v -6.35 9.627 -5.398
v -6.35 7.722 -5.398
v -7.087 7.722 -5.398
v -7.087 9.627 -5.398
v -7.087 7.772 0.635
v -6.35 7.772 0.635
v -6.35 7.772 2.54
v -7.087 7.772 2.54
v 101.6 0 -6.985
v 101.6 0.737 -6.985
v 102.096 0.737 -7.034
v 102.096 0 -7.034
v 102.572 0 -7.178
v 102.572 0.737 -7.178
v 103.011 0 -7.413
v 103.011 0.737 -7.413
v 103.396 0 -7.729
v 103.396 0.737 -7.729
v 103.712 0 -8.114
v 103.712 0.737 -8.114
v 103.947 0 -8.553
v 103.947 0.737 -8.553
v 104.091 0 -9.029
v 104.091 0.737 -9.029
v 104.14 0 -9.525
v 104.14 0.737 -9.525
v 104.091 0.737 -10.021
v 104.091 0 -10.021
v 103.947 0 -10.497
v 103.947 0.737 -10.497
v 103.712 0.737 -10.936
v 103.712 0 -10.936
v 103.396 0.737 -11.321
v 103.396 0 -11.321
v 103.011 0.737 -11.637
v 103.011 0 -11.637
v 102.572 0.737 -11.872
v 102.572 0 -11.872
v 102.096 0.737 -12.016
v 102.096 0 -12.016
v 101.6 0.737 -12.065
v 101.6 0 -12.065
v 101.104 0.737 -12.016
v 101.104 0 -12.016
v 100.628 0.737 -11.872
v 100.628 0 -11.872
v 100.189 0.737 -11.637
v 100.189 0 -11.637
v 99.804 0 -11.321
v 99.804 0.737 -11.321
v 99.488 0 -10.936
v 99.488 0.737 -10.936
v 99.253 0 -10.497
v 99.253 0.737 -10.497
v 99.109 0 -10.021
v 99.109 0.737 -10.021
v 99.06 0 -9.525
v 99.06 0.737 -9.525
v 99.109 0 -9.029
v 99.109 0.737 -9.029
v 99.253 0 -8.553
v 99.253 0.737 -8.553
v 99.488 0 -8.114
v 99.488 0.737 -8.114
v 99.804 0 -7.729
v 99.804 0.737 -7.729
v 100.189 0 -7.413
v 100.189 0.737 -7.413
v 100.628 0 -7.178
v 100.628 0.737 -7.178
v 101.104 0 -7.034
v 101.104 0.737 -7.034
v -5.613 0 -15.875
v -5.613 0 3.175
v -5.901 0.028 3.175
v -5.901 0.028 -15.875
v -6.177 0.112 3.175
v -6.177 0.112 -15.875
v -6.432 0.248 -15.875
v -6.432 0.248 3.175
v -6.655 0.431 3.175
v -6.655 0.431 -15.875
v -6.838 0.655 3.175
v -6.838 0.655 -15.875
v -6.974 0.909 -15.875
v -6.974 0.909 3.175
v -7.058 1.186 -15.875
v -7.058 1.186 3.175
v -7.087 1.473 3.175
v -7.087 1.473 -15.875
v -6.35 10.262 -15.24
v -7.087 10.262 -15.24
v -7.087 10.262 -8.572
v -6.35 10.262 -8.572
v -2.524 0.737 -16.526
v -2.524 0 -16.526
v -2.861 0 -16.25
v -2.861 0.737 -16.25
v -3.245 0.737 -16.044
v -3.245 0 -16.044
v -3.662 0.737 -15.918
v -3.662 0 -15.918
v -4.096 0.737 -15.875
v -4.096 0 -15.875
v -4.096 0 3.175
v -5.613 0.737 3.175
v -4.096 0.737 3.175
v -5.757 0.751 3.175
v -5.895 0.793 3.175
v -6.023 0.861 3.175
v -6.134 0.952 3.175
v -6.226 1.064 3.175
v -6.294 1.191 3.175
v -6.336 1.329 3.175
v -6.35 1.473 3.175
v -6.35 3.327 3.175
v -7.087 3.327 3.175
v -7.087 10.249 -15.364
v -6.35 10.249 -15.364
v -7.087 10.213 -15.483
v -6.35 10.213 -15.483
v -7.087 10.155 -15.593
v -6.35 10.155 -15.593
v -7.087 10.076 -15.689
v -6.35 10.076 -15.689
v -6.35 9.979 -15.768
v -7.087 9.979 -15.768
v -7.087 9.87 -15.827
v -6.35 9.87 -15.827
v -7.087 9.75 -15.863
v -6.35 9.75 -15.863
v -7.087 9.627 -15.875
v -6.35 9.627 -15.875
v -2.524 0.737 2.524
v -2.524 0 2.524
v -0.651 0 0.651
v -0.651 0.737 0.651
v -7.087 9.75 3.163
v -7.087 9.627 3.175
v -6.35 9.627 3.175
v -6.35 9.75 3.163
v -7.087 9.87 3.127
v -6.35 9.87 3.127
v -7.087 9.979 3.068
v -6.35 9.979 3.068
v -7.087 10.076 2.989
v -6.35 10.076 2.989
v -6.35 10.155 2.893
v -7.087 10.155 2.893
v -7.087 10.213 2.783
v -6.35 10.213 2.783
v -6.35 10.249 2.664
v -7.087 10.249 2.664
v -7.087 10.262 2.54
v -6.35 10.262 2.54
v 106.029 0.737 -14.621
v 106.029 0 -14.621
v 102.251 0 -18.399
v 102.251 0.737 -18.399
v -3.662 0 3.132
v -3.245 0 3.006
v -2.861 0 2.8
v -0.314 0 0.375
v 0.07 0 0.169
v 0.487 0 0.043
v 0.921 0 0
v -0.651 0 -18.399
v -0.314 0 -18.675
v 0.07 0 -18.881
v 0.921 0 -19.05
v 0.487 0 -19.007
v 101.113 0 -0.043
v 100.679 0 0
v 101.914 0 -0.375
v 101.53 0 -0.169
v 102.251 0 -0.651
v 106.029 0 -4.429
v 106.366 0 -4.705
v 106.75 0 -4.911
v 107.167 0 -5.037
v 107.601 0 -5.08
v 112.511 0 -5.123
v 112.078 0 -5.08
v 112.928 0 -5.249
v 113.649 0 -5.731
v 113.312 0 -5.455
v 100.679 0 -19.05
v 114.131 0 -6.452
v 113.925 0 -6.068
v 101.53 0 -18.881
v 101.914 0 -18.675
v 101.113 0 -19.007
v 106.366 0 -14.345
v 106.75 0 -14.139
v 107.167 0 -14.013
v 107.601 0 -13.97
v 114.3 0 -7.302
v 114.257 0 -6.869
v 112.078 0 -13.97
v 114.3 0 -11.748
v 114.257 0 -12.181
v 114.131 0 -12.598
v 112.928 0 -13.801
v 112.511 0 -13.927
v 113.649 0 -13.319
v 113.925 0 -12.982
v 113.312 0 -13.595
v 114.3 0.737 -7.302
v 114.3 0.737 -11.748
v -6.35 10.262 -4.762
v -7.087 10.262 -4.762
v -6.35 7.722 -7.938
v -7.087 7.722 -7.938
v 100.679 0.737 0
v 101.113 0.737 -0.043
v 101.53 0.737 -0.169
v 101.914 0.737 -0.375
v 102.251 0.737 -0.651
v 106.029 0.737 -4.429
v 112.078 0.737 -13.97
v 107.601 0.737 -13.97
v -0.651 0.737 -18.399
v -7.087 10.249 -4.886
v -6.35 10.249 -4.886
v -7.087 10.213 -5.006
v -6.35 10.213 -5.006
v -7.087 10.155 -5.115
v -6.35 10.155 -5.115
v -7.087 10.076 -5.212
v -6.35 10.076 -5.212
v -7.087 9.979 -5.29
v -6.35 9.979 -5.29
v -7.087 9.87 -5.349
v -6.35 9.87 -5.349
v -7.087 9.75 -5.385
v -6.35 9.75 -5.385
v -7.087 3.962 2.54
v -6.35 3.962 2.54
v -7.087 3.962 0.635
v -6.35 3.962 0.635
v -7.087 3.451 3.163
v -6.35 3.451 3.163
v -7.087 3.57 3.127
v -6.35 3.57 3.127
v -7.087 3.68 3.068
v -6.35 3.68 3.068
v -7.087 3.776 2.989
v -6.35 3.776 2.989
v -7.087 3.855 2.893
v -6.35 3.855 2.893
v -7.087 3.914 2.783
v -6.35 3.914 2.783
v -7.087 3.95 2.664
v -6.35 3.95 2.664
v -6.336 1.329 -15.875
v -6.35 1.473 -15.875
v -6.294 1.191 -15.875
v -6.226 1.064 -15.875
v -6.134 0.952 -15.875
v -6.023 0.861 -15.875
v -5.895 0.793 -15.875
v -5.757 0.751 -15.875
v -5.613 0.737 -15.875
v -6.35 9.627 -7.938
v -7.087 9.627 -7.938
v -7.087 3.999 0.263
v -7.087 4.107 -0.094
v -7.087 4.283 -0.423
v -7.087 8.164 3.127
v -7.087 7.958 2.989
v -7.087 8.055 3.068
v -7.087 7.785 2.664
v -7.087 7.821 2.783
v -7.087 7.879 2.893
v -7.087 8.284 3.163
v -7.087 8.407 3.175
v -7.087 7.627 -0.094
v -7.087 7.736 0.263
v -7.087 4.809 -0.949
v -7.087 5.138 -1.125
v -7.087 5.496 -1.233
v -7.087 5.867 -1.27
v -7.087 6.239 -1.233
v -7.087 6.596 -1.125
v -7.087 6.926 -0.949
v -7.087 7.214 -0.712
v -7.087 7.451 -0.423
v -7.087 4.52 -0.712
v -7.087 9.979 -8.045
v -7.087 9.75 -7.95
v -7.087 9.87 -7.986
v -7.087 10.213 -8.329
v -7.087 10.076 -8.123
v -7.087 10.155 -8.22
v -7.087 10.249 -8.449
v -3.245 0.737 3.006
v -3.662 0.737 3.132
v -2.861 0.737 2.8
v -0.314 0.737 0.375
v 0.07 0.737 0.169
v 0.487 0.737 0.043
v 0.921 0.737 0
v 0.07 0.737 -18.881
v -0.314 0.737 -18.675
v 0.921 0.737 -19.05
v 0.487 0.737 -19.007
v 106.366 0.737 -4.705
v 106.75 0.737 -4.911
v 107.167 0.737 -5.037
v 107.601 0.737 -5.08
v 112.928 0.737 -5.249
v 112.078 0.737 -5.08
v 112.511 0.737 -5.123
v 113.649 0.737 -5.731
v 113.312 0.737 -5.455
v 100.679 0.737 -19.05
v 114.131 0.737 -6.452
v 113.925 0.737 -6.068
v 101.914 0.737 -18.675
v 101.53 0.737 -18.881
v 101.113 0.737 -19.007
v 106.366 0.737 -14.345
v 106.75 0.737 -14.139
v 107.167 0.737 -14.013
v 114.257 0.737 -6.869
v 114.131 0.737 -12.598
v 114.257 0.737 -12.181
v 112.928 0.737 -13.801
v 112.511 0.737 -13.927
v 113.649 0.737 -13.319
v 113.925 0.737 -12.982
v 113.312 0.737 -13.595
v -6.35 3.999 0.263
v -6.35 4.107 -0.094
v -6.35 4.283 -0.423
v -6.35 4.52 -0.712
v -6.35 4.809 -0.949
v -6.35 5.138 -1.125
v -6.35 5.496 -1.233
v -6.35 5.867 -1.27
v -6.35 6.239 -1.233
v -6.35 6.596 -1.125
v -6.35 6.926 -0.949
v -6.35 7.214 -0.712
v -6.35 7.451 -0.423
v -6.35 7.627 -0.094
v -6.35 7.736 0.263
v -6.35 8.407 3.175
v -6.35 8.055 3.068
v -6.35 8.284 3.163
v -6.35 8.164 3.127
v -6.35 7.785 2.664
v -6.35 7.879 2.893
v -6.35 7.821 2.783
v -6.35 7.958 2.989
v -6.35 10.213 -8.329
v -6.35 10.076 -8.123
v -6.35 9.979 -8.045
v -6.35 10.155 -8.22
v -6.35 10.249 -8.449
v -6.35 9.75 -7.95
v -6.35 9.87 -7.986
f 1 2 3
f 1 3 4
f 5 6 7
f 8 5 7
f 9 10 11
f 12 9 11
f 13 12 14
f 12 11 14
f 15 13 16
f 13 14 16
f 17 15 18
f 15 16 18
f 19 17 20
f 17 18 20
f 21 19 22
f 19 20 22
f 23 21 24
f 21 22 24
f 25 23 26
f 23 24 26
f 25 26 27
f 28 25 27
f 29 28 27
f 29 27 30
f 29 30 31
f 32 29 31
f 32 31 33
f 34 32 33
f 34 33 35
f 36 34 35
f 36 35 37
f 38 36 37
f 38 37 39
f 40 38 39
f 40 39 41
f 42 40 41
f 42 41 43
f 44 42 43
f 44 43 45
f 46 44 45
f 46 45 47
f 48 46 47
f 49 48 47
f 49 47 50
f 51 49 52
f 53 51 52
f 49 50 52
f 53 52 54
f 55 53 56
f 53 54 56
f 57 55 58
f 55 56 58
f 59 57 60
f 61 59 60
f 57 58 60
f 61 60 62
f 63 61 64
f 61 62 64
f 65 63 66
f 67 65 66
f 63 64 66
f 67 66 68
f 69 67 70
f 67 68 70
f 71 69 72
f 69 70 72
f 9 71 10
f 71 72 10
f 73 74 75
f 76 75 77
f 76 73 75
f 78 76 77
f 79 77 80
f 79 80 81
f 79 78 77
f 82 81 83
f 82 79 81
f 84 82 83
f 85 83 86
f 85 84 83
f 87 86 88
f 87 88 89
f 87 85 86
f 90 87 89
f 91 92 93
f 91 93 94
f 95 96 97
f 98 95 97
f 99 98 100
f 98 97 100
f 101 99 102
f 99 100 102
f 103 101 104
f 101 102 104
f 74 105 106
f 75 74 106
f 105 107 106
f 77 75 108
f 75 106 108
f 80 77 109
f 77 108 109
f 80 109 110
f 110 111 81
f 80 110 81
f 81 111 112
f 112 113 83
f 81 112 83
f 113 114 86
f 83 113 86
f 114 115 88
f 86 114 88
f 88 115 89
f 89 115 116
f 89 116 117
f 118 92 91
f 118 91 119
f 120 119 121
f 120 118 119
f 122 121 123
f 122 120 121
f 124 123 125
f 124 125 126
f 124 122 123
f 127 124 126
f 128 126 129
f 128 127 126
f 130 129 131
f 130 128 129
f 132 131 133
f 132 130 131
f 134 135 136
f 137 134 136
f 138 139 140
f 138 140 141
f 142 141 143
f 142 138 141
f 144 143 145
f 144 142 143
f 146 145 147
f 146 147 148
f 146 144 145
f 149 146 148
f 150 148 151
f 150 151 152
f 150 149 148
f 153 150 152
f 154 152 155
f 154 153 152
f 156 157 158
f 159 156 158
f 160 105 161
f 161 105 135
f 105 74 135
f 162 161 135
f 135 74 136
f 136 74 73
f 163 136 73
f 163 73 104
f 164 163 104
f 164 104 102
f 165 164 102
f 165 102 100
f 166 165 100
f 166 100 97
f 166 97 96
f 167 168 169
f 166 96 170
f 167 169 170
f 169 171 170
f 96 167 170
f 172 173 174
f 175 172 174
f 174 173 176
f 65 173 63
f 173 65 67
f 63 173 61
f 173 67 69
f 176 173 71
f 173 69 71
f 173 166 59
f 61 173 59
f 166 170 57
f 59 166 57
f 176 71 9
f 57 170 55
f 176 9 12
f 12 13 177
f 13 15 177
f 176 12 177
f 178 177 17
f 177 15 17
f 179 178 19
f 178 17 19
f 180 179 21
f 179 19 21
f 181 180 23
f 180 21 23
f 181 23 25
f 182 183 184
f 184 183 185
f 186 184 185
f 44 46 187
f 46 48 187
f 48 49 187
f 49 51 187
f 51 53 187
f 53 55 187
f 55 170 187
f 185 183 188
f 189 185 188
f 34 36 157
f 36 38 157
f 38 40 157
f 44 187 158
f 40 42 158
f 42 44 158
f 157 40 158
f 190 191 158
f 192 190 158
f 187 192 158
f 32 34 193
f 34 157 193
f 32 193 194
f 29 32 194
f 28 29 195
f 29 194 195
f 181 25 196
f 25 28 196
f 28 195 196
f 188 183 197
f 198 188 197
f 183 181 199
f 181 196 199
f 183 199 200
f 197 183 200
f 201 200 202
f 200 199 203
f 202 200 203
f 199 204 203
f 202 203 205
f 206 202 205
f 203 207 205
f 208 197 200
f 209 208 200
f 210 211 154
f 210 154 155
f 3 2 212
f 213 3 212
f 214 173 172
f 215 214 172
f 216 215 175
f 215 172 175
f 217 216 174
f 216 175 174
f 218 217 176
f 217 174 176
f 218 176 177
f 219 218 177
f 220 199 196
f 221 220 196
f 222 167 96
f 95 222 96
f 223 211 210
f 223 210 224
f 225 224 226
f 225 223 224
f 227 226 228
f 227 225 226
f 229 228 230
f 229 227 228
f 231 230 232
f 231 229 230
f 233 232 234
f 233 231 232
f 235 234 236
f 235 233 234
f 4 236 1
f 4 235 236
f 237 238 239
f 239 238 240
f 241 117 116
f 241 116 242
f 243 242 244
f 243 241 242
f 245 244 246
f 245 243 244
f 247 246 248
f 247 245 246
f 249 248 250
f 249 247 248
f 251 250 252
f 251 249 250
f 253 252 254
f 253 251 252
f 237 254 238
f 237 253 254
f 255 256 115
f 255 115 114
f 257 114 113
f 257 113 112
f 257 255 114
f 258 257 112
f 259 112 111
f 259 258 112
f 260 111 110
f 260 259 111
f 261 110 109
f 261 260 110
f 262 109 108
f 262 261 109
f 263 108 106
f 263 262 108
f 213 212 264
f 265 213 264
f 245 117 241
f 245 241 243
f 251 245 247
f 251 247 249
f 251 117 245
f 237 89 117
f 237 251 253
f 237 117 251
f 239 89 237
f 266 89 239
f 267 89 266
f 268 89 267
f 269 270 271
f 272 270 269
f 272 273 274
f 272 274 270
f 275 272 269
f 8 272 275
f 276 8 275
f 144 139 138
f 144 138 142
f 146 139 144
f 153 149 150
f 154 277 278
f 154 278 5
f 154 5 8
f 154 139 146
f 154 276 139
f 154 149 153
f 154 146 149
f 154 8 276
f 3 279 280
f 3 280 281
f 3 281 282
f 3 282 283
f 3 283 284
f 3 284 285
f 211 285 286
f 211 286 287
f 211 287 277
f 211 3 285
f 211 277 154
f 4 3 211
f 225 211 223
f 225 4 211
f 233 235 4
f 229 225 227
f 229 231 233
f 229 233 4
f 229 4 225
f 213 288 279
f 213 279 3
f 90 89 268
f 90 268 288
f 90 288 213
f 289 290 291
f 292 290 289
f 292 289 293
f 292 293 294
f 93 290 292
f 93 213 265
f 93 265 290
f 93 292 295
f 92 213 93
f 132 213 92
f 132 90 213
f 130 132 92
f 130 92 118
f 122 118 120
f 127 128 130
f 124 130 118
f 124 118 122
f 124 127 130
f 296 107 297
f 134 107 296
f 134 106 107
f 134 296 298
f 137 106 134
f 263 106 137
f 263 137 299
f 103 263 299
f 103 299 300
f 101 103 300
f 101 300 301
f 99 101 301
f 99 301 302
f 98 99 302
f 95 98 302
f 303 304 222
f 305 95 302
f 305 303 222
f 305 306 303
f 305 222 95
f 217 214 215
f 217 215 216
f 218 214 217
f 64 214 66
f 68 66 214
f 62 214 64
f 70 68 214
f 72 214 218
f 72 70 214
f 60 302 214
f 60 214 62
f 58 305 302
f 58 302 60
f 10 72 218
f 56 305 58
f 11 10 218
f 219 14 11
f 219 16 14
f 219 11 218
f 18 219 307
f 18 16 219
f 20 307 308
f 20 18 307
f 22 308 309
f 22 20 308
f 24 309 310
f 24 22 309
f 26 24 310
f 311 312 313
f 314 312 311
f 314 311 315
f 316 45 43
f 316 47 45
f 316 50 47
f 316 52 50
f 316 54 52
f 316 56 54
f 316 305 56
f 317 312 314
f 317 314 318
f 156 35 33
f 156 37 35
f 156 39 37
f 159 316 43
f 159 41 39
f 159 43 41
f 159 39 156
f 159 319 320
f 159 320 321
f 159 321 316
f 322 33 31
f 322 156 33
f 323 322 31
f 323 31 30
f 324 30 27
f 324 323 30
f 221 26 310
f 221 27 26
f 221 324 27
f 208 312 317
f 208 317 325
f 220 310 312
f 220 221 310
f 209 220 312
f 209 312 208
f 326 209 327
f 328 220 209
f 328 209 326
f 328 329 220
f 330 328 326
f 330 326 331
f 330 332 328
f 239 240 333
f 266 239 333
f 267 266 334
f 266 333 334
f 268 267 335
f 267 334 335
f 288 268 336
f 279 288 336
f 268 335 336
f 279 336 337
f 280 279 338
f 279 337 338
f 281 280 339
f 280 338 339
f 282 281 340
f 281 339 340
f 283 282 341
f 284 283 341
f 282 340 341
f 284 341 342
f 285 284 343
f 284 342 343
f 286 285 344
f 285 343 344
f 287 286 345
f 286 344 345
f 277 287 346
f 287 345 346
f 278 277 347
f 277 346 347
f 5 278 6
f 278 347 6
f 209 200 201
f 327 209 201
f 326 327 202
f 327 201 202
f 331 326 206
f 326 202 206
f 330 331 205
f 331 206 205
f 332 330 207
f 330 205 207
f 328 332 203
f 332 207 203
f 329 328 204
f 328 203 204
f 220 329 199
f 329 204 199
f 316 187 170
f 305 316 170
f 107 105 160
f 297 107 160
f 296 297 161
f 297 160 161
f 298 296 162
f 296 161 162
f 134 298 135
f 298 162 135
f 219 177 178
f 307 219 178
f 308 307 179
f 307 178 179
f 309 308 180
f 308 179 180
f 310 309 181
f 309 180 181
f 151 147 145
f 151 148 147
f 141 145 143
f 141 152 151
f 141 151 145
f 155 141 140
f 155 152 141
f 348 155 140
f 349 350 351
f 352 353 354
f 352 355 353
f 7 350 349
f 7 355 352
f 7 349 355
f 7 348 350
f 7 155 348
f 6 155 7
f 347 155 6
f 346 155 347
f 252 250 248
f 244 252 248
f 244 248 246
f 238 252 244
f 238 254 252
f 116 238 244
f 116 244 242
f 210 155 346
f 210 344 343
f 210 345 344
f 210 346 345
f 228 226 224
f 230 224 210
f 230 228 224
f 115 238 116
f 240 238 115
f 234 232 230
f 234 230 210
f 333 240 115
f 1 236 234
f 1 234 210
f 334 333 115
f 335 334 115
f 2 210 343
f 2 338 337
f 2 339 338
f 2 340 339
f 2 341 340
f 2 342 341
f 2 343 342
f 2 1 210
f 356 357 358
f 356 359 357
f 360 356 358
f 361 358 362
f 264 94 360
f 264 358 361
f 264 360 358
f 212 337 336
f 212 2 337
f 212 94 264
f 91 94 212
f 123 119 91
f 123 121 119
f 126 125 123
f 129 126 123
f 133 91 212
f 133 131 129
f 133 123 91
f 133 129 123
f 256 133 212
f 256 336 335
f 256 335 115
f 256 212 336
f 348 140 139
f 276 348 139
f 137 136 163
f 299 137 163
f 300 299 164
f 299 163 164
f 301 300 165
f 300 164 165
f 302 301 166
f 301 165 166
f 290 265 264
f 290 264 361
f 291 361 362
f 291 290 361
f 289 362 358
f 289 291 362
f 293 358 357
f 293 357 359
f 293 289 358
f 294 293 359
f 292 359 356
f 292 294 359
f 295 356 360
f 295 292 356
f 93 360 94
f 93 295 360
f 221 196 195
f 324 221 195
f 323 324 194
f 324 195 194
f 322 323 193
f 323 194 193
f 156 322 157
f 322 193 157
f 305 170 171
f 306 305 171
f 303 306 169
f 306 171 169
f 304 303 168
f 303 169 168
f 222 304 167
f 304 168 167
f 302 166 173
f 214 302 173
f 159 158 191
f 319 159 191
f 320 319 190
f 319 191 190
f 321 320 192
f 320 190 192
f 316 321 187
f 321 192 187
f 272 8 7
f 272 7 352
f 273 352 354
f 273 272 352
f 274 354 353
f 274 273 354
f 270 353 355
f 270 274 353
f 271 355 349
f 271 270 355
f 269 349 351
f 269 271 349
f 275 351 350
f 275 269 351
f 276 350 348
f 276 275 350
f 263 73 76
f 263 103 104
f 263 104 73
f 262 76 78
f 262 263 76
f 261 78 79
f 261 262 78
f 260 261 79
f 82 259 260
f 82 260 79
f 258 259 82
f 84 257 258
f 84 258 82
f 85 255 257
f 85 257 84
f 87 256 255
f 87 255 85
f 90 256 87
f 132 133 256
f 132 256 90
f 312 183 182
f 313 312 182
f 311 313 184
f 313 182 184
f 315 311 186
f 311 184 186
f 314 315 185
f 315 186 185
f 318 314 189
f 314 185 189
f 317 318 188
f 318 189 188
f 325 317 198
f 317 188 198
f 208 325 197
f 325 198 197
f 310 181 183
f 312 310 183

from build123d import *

# Parameters (mm, degrees)
SM_BASE_FLANGE_2_DEPTH           = 0.7366
SKETCH4_R                        = 2.54
CUT_EXTRUDE_3_DEPTH              = 116.878967374
SM_EDGE_FLANGE_4_STRIP_W         = 4.4196
SM_EDGE_FLANGE_4_STRIP_H         = 0.7366
SM_EDGE_FLANGE_4_STRIP_CUT_DEPTH = 19.05
SM_EDGE_FLANGE_4_DEPTH           = 19.05
SKETCH8_W                        = 2.54
SKETCH8_H                        = 2.54
CUT_EXTRUDE_5_DEPTH              = 123.574978827
OTHER_START                      = -7.0866
OTHER_6_DEPTH                    = 0.7366


# Read off the part's stored shape, not the designer's step: 6
# Sheet-metal steps are written as plain solids
with BuildPart() as part:
    # Sketch1 → 2 (new body)
    with BuildSketch(Plane(origin=(0, 0, 0), x_dir=(1, 0, 0), z_dir=(0, 1, 0))):
        with BuildLine():
            Line((0.920589642, 0), (100.679410358, 0))
            ThreePointArc((100.679410358, 0), (101.529924286, 0.169177739), (102.250955179, 0.650955179))
            Line((102.250955179, 0.650955179), (106.029044821, 4.429044821))
            ThreePointArc((106.029044821, 4.429044821), (106.750075714, 4.910822261), (107.600589642, 5.08))
            Line((107.600589642, 5.08), (112.0775, 5.08))
            ThreePointArc((112.0775, 5.08), (113.649044821, 5.730955179), (114.3, 7.3025))
            Line((114.3, 7.3025), (114.3, 11.7475))
            ThreePointArc((114.3, 11.7475), (113.649044821, 13.319044821), (112.0775, 13.97))
            Line((112.0775, 13.97), (107.600589642, 13.97))
            ThreePointArc((107.600589642, 13.97), (106.750075714, 14.139177739), (106.029044821, 14.620955179))
            Line((106.029044821, 14.620955179), (102.250955179, 18.399044821))
            ThreePointArc((102.250955179, 18.399044821), (101.529924286, 18.880822261), (100.679410358, 19.05))
            Line((100.679410358, 19.05), (0.920589642, 19.05))
            ThreePointArc((0.920589642, 19.05), (0.070075714, 18.880822261), (-0.650955179, 18.399044821))
            Line((-0.650955179, 18.399044821), (-2.524044821, 16.525955179))
            ThreePointArc((-2.524044821, 16.525955179), (-3.245075714, 16.044177739), (-4.095589642, 15.875))
            Line((-4.095589642, 15.875), (-6.35, 15.875))
            Line((-6.35, 15.875), (-6.35, -3.175))
            Line((-6.35, -3.175), (-4.095589642, -3.175))
            ThreePointArc((-4.095589642, -3.175), (-3.245075714, -3.005822261), (-2.524044821, -2.524044821))
            Line((-2.524044821, -2.524044821), (-0.650955179, -0.650955179))
            ThreePointArc((-0.650955179, -0.650955179), (0.070075714, -0.169177739), (0.920589642, 0))
        make_face()
    extrude(amount=SM_BASE_FLANGE_2_DEPTH)

    # Sketch4 → 3 (cut, through all)
    with BuildSketch(Plane(origin=(0, 0.7366, 0), x_dir=(-1, 0, 0), z_dir=(0, 1, 0))):
        with Locations(Location((-101.6, -9.525, 0), (0, 0, 90))):
            Circle(SKETCH4_R)
    extrude(amount=-CUT_EXTRUDE_3_DEPTH, mode=Mode.SUBTRACT)

    # 4 strip (across the edge) → 4 strip cut (cut)
    with BuildSketch(Plane(origin=(-6.35, 0.7366, -15.875), x_dir=(1, 0, 0), z_dir=(0, 0, 1))):
        with Locations((-1.4732, -0.3683)):
            Rectangle(SM_EDGE_FLANGE_4_STRIP_W, SM_EDGE_FLANGE_4_STRIP_H)
    extrude(amount=SM_EDGE_FLANGE_4_STRIP_CUT_DEPTH, mode=Mode.SUBTRACT)

    # 4 section (across the edge) → 4 (add)
    with BuildSketch(Plane(origin=(-6.35, 0.7366, -15.875), x_dir=(1, 0, 0), z_dir=(0, 0, 1))):
        with BuildLine():
            Line((-0.7366, 0.7366), (-0.7366, 9.525))
            Line((-0.7366, 9.525), (0, 9.525))
            Line((0, 9.525), (0, 0.7366))
            ThreePointArc((0, 0.7366), (0.215745145, 0.215745145), (0.7366, 0))
            Line((0.7366, 0), (0.7366, -0.7366))
            ThreePointArc((0.7366, -0.7366), (-0.30510971, -0.30510971), (-0.7366, 0.7366))
        make_face()
    extrude(amount=SM_EDGE_FLANGE_4_DEPTH)

    # Sketch8 → 5 (cut, through all)
    with BuildSketch(Plane(origin=(-6.35, 0, 0), x_dir=(0, 0, -1), z_dir=(1, 0, 0))):
        with BuildLine():
            Line((-0.635, 7.7724), (-3.175, 7.7724))
            Line((-3.175, 7.7724), (-3.175, 3.9624))
            Line((-3.175, 3.9624), (-0.635, 3.9624))
            ThreePointArc((-0.635, 3.9624), (1.27, 5.8674), (-0.635, 7.7724))
        make_face()
        with Locations((6.6675, 8.9916)):
            Rectangle(SKETCH8_W, SKETCH8_H)
    extrude(amount=-CUT_EXTRUDE_5_DEPTH, mode=Mode.SUBTRACT)

    # Other 6 outline → Other 6 (cut)
    with BuildSketch(Plane.YZ.offset(OTHER_START)):
        with BuildLine():
            ThreePointArc((3.3274, 3.175), (3.776412806, 2.989012806), (3.9624, 2.54))
            Line((3.9624, 2.54), (3.9624, 3.175))
            Line((3.9624, 3.175), (3.3274, 3.175))
        make_face()
        with BuildLine():
            ThreePointArc((7.7724, 2.54), (7.958387194, 2.989012806), (8.4074, 3.175))
            Line((8.4074, 3.175), (7.7724, 3.175))
            Line((7.7724, 3.175), (7.7724, 2.54))
        make_face()
        with BuildLine():
            Line((10.2616, -5.3975), (10.2616, -4.7625))
            ThreePointArc((10.2616, -4.7625), (10.075612806, -5.211512806), (9.6266, -5.3975))
            Line((9.6266, -5.3975), (10.2616, -5.3975))
        make_face()
        with BuildLine():
            Line((10.2616, 3.175), (9.6266, 3.175))
            ThreePointArc((9.6266, 3.175), (10.075612806, 2.989012806), (10.2616, 2.54))
            Line((10.2616, 2.54), (10.2616, 3.175))
        make_face()
        with BuildLine():
            Line((10.2616, -15.875), (10.2616, -15.24))
            ThreePointArc((10.2616, -15.24), (10.075612806, -15.689012806), (9.6266, -15.875))
            Line((9.6266, -15.875), (10.2616, -15.875))
        make_face()
        with BuildLine():
            ThreePointArc((9.6266, -7.9375), (10.075612806, -8.123487194), (10.2616, -8.5725))
            Line((10.2616, -8.5725), (10.2616, -7.9375))
            Line((10.2616, -7.9375), (9.6266, -7.9375))
        make_face()
    extrude(amount=OTHER_6_DEPTH, mode=Mode.SUBTRACT)


solid = part.part
